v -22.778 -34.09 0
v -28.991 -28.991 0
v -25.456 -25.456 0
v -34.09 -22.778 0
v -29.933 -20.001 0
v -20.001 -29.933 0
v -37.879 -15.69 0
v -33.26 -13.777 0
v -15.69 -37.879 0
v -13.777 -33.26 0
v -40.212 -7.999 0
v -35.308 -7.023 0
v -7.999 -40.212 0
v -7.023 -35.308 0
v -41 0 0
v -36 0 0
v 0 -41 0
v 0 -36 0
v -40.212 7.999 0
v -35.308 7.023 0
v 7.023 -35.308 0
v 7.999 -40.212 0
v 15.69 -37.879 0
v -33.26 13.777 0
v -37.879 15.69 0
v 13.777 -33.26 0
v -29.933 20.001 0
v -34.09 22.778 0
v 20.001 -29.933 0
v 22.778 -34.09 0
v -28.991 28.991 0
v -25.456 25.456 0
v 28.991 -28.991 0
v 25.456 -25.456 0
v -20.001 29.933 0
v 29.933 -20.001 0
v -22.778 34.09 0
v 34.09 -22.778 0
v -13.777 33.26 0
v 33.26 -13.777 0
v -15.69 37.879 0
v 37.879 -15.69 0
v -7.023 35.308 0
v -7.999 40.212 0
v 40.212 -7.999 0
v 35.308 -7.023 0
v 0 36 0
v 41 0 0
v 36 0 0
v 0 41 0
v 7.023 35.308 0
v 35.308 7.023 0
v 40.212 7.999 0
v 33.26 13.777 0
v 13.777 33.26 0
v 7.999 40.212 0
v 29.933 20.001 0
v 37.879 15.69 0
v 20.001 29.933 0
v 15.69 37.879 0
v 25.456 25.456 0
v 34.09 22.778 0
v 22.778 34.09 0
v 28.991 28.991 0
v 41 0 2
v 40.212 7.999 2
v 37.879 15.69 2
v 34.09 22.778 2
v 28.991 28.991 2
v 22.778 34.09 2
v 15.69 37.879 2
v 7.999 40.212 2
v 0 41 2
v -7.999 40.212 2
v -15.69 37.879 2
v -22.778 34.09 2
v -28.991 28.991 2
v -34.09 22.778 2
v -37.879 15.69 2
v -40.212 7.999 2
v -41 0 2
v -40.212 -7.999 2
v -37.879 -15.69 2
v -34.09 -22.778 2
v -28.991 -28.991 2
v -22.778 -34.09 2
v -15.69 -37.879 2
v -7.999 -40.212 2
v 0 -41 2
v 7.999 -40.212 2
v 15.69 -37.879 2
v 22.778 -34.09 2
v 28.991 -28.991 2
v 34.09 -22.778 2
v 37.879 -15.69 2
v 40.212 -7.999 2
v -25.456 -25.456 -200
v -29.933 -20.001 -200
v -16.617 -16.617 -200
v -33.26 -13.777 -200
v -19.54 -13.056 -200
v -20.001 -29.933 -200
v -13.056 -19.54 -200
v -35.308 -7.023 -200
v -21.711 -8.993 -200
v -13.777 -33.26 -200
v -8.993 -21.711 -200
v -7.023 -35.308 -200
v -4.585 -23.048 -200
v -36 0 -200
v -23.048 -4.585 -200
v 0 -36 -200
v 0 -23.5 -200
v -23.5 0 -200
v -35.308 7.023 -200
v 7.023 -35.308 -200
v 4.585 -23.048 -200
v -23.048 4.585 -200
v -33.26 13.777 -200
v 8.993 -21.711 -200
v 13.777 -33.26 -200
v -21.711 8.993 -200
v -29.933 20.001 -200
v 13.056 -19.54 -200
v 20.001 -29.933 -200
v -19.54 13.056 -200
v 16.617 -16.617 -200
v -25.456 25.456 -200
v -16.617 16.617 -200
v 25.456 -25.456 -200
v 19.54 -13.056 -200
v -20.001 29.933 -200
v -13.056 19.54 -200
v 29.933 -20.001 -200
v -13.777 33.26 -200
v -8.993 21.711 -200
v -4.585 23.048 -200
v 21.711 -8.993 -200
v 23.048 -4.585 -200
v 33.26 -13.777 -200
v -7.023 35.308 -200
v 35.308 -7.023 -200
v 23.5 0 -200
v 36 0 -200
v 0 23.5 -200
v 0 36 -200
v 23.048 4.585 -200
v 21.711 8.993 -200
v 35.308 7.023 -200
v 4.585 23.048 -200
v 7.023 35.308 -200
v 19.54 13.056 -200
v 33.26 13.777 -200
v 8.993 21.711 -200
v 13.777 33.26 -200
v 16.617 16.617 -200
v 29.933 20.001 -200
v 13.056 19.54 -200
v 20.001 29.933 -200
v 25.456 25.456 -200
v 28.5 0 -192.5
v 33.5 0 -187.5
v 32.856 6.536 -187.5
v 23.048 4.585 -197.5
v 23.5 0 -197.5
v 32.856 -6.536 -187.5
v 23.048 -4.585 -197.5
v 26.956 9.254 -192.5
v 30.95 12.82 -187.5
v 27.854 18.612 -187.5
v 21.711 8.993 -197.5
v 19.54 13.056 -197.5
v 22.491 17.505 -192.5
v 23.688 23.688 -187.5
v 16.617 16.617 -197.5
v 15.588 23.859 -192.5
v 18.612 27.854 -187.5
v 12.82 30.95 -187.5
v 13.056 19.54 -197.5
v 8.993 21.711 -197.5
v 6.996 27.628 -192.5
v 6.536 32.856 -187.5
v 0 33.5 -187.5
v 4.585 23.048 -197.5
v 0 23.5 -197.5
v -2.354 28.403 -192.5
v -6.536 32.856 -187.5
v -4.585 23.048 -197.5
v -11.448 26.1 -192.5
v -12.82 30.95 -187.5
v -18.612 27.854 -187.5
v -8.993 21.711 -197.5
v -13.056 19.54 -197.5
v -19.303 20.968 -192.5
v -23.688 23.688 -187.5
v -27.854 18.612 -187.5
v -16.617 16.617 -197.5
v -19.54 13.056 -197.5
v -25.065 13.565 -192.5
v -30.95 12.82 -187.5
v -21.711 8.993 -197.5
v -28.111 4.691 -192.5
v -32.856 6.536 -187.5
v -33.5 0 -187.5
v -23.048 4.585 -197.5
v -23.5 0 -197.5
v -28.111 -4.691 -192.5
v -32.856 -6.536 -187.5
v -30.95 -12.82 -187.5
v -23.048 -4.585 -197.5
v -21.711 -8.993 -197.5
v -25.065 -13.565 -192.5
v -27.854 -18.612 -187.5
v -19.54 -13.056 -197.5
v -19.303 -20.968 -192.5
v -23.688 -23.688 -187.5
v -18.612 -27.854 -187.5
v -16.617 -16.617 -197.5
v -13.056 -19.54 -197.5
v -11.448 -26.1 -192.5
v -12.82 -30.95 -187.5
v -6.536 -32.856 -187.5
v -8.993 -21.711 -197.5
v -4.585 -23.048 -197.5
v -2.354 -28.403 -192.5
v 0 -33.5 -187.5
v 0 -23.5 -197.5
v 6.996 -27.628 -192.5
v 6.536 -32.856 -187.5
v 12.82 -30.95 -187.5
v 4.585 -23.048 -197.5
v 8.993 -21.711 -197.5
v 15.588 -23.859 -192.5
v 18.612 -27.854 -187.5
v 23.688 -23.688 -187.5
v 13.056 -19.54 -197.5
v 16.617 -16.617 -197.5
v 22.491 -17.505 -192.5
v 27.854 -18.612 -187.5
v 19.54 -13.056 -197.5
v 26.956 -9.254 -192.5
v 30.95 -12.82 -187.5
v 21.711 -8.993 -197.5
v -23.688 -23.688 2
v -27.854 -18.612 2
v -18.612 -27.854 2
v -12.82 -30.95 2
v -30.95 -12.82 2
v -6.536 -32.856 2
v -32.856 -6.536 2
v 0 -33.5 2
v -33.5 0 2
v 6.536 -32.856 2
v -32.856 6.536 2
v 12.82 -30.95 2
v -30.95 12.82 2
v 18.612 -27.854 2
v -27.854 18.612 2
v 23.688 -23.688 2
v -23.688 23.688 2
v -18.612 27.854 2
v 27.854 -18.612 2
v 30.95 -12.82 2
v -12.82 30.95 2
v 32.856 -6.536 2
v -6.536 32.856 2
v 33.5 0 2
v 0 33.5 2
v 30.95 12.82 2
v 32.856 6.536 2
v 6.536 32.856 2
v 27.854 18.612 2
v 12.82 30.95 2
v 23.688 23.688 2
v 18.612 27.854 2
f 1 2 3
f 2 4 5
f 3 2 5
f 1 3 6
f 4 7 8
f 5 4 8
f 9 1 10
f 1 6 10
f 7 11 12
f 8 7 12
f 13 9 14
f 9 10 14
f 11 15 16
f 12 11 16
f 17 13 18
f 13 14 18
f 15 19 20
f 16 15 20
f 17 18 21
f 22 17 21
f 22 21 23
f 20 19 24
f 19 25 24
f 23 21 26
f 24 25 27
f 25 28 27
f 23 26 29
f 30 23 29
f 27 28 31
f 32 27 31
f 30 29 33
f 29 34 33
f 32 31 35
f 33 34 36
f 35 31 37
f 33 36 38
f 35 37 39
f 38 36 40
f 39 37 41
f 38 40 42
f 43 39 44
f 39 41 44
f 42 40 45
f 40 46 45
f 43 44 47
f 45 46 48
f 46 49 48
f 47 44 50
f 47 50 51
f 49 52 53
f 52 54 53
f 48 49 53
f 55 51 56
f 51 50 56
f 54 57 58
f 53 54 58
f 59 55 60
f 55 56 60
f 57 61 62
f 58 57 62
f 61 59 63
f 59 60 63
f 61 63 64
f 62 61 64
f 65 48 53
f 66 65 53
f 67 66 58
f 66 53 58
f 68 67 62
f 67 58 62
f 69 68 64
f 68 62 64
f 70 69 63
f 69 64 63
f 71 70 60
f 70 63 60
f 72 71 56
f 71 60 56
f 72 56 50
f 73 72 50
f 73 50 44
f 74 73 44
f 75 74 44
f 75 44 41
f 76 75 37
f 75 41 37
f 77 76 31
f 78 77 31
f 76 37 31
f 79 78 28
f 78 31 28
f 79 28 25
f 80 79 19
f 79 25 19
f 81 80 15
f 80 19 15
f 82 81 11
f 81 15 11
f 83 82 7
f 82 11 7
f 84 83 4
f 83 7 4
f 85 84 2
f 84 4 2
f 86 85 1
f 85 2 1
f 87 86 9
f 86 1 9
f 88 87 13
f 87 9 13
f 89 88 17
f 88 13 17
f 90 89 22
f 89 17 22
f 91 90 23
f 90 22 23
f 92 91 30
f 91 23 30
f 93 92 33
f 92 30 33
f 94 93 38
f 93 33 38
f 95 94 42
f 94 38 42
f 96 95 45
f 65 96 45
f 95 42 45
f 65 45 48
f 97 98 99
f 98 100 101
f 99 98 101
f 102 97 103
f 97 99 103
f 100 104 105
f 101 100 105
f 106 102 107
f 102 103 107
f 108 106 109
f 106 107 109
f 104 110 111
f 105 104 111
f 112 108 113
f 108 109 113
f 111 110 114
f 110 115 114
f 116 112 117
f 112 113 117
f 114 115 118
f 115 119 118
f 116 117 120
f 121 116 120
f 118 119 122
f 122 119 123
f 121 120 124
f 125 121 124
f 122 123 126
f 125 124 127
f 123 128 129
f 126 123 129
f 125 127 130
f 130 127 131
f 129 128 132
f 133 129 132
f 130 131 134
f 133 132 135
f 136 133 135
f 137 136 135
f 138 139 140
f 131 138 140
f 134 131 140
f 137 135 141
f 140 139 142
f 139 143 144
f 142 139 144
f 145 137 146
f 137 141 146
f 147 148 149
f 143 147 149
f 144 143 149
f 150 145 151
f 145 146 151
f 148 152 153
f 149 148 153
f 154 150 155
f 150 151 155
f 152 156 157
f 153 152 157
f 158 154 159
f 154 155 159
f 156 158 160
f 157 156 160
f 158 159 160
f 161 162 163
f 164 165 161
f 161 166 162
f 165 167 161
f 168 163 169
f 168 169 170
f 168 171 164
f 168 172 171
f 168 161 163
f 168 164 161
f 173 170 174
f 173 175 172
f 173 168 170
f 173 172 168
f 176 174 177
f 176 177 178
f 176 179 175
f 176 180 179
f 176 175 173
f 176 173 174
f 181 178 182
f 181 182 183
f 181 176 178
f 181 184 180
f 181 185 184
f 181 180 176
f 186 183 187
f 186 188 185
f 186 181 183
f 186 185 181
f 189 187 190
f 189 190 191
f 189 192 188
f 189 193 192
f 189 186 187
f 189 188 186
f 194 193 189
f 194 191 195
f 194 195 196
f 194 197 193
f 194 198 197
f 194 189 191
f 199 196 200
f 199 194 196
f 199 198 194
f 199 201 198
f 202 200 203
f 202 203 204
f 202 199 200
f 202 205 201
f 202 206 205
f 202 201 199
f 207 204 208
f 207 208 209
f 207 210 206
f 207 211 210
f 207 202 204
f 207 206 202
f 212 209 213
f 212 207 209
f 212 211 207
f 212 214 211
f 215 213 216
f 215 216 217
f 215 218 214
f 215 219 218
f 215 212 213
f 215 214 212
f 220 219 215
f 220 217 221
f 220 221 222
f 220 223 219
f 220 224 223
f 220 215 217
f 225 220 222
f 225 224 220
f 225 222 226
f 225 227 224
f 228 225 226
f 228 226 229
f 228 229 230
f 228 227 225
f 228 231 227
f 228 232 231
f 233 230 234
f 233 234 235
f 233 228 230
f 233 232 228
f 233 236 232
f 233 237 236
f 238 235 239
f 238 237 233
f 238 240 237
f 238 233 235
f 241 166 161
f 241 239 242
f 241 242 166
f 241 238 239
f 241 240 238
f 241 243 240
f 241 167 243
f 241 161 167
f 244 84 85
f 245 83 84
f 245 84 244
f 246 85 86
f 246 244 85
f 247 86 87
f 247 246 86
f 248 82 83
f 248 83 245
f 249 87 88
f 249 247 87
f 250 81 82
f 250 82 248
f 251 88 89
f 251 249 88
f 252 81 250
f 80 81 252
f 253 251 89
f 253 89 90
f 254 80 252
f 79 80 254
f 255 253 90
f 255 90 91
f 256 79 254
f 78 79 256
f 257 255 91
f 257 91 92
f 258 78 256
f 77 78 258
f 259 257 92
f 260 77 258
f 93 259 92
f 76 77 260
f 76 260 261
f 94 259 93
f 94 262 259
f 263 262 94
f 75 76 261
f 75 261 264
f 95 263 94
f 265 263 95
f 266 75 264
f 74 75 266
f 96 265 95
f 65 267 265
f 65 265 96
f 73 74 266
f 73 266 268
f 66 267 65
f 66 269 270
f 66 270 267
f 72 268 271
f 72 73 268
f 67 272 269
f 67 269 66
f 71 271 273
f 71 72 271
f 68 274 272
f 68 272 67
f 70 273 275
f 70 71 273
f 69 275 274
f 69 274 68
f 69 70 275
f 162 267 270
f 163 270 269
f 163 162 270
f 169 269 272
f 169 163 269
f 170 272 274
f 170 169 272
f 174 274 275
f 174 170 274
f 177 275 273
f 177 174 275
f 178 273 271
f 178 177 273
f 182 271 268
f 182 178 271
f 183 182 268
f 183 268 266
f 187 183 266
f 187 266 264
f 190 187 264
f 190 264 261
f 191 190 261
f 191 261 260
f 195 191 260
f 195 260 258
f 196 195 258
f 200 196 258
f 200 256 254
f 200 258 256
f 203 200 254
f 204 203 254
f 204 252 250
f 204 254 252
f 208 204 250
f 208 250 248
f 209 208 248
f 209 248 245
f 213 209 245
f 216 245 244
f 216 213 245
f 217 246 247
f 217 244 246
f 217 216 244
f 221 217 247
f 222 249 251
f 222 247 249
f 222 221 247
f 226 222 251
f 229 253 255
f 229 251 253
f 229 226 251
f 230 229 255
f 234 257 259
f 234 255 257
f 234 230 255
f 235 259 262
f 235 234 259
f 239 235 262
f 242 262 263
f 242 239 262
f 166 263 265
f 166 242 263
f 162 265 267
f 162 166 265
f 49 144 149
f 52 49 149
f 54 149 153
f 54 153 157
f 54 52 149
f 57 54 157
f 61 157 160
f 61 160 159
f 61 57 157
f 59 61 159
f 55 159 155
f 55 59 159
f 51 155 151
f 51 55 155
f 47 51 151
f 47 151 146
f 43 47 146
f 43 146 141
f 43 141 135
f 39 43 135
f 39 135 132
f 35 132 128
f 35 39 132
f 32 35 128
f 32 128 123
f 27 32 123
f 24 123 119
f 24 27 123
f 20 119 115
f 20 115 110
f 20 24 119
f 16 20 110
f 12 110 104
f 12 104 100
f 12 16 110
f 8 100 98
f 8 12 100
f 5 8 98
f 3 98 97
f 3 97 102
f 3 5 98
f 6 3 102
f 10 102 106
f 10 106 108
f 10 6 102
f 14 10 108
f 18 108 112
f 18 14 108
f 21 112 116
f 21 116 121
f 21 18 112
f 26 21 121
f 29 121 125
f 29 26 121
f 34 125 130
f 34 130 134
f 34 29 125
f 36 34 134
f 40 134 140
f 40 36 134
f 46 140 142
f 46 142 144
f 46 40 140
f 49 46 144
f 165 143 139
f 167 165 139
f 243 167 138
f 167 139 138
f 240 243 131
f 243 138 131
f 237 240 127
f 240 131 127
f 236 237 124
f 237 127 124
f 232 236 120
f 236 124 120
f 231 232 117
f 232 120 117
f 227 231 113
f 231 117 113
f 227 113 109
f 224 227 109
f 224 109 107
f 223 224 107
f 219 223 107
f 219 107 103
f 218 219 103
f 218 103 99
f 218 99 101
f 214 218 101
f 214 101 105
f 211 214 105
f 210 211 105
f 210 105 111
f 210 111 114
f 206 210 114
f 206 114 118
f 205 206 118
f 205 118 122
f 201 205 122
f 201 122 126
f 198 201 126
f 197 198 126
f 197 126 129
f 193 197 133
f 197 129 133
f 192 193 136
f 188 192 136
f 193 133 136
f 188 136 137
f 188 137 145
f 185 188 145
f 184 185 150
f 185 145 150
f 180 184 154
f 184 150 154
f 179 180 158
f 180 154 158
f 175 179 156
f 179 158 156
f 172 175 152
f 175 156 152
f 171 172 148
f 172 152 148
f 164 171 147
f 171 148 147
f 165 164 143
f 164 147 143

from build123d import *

# Parameters (mm, degrees)
F0_R     = 41
F0_R_2   = 36
F1_DEPTH = 2
F2_DEPTH = 200
F3_T     = 2.5
F5_R     = 23.5
F6_DEPTH = 25
F7_SIZE  = 9.99999


# Not quite as in the source:
# - a fillet or chamfer is up to 0.001 mm smaller than in the source, because OpenCascade refuses the exact size
# - a shell that OpenCascade refuses in one call is made with other operations: the cavity is built on its own and cut out


with BuildPart() as f1:
    # F0 (on Top) → F1 (new body)
    with BuildSketch(Plane.XY):
        Circle(F0_R)
        Circle(F0_R_2, mode=Mode.SUBTRACT)
        Circle(F0_R_2)
    extrude(amount=F1_DEPTH)

    # F0 (on Top) → F2 (join)
    with BuildSketch(Plane.XY):
        Circle(F0_R_2)
    extrude(amount=-F2_DEPTH)

    # F3: shell of thickness 2.5, made by hand


with BuildPart() as f3_core1:
    # F3_t2: copy of F1
    add(f1.part)

    # the walls: a layer under each face that stays
    f3_faces = [f3_core1.faces().sort_by_distance(p)[0] for p in [
        (-41, 0, 1),
        (-27.3333333333, -27.3333333333, 0),
        (-36, 0, -100),
        (0, 0, -200),
    ]]
    thicken(f3_faces, amount=-F3_T, mode=Mode.SUBTRACT)

    # F3_s3 → F3_t4 (revolve, cut)
    with BuildSketch(Plane.XZ):
        Polygon((36.025, -0.025), (36, 2.5), (33.5, 2.5), (33.5, 0), align=None)
    revolve(axis=Axis((0, 0, 0), (0, 0, 1)), mode=Mode.SUBTRACT)


with BuildPart() as f1_1:
    add(f1.part)

    # what is left inside the walls is the cavity
    f3_cavity = [f3_core1.part.solids().sort_by_distance(p)[0] for p in [
        (-33.475, 0, -64.5),
    ]]
    add(f3_cavity, mode=Mode.SUBTRACT)

    # F5 (on offset) → F6 (cut)
    with BuildSketch(Plane(origin=(0, 0, -200), x_dir=(1, 0, 0), z_dir=(0, 0, -1))):
        Circle(F5_R)
    extrude(amount=-F6_DEPTH, mode=Mode.SUBTRACT)

    # F7 (size 10 in the source; OpenCascade refuses exactly that, so slightly less here)
    f7_edges = [f1_1.edges().sort_by_distance(p)[0] for p in [
        (33.5, 0, -97.75),
        (-33.5, 0, -197.5),
    ]]
    chamfer(f7_edges, length=F7_SIZE)


solid = f1_1.part
